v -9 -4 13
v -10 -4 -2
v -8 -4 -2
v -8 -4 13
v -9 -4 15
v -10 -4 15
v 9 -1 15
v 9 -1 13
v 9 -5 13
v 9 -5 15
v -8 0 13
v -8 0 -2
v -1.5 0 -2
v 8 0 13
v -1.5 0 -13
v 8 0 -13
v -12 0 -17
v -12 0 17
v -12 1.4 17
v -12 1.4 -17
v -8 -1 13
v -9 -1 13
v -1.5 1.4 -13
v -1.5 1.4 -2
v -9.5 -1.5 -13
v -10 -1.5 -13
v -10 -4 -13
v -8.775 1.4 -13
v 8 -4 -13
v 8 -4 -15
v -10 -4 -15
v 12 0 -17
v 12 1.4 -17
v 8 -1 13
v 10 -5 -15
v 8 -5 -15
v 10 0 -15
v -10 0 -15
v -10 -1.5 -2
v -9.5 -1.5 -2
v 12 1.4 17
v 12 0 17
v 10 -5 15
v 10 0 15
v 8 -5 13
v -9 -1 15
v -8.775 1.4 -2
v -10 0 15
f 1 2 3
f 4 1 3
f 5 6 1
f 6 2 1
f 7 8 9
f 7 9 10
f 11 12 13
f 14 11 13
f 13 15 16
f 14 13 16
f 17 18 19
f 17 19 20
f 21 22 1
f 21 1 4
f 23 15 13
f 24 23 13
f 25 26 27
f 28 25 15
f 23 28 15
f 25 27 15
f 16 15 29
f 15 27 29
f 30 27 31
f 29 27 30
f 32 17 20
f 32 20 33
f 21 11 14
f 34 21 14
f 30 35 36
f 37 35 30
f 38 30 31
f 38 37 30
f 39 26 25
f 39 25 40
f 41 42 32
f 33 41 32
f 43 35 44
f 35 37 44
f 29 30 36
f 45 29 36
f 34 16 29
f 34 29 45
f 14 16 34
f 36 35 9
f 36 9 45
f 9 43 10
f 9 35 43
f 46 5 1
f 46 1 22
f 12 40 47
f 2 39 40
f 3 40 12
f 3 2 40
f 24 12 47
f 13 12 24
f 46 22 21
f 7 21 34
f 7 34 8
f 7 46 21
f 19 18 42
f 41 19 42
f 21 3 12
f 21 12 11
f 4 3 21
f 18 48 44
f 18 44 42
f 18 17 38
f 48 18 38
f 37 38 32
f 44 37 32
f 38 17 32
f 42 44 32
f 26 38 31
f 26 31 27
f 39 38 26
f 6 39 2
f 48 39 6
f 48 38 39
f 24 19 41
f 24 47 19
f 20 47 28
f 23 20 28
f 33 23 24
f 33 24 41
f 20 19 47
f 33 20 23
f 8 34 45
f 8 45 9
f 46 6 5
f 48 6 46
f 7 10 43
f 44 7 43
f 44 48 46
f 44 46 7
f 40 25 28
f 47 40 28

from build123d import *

# Parameters (mm, degrees)
SZKIC1_W                    = 24
SZKIC1_H                    = 34
DODANIE_WYCI_GNI_CIE1_DEPTH = 1.4
SZKIC2_W                    = 20
SZKIC2_H                    = 30
SZKIC2_W_2                  = 16
SZKIC2_H_2                  = 26
DODANIE_WYCI_GNI_CIE2_DEPTH = 4
SZKIC3_W                    = 6.5
SZKIC3_H                    = 11
WYTNIJ_WYCI_GNI_CIE1_DEPTH  = 22.1896201
SZKIC4_W                    = 18
SZKIC4_H                    = 3
WYTNIJ_WYCI_GNI_CIE2_DEPTH  = 2
SZKIC5_W                    = 11
SZKIC5_H                    = 2.5
WYTNIJ_WYCI_GNI_CIE3_DEPTH  = 2
SFAZOWANIE1_SIZE            = 1.5
SFAZOWANIE1_SIZE_2          = 6
DODANIE_WYCI_GNI_CIE3_DEPTH = 1


with BuildPart() as part:
    # Szkic1 → Dodanie-wyciągnięcie1 (new body)
    with BuildSketch(Plane(origin=(0, 0, 0), x_dir=(1, 0, 0), z_dir=(0, 1, 0))):
        Rectangle(SZKIC1_W, SZKIC1_H)
    extrude(amount=DODANIE_WYCI_GNI_CIE1_DEPTH)

    # Szkic2 → Dodanie-wyciągnięcie2 (add)
    with BuildSketch(Plane.XZ):
        Rectangle(SZKIC2_W, SZKIC2_H)
        Rectangle(SZKIC2_W_2, SZKIC2_H_2, mode=Mode.SUBTRACT)
    extrude(amount=DODANIE_WYCI_GNI_CIE2_DEPTH)

    # Szkic3 → Wytnij-wyciągnięcie1 (cut, through all)
    with BuildSketch(Plane.XZ):
        with Locations((-4.75, -7.5)):
            Rectangle(SZKIC3_W, SZKIC3_H)
    extrude(amount=-WYTNIJ_WYCI_GNI_CIE1_DEPTH, mode=Mode.SUBTRACT)

    # Szkic4 → Wytnij-wyciągnięcie2 (cut)
    with BuildSketch(Plane.XY.offset(15)):
        with Locations((0, -2.5)):
            Rectangle(SZKIC4_W, SZKIC4_H)
    extrude(amount=-WYTNIJ_WYCI_GNI_CIE2_DEPTH, mode=Mode.SUBTRACT)

    # Szkic5 → Wytnij-wyciągnięcie3 (cut)
    with BuildSketch(Plane.ZY.offset(10)):
        with Locations((-7.5, -2.75)):
            Rectangle(SZKIC5_W, SZKIC5_H)
    extrude(amount=-WYTNIJ_WYCI_GNI_CIE3_DEPTH, mode=Mode.SUBTRACT)

    # Sfazowanie1
    # the kernel refuses this chamfer: 6, 1.5 mm, written as the material it takes off along each edge
    with BuildSketch(Plane(origin=(-8, -1.5, -13), x_dir=(-0.9890197255468893, -0.14778356633657133, 0), z_dir=(0, 0, 1))) as sfazowanie1_piece_1:
        Polygon((SFAZOWANIE1_SIZE * 0.989019725547, -SFAZOWANIE1_SIZE * 0.147783566337), (-SFAZOWANIE1_SIZE_2 * 0.147783566337, -SFAZOWANIE1_SIZE_2 * 0.989019725547), (0, 0), align=None)
    extrude(amount=11, mode=Mode.SUBTRACT)

    # Szkic6 → Dodanie-wyciągnięcie3 (add)
    with BuildSketch(Plane.XZ.offset(4)):
        Polygon((10, -15), (8, -15), (8, 13), (9, 13), (9, 15), (10, 15), (10, 13), align=None)
    extrude(amount=DODANIE_WYCI_GNI_CIE3_DEPTH)


solid = part.part
